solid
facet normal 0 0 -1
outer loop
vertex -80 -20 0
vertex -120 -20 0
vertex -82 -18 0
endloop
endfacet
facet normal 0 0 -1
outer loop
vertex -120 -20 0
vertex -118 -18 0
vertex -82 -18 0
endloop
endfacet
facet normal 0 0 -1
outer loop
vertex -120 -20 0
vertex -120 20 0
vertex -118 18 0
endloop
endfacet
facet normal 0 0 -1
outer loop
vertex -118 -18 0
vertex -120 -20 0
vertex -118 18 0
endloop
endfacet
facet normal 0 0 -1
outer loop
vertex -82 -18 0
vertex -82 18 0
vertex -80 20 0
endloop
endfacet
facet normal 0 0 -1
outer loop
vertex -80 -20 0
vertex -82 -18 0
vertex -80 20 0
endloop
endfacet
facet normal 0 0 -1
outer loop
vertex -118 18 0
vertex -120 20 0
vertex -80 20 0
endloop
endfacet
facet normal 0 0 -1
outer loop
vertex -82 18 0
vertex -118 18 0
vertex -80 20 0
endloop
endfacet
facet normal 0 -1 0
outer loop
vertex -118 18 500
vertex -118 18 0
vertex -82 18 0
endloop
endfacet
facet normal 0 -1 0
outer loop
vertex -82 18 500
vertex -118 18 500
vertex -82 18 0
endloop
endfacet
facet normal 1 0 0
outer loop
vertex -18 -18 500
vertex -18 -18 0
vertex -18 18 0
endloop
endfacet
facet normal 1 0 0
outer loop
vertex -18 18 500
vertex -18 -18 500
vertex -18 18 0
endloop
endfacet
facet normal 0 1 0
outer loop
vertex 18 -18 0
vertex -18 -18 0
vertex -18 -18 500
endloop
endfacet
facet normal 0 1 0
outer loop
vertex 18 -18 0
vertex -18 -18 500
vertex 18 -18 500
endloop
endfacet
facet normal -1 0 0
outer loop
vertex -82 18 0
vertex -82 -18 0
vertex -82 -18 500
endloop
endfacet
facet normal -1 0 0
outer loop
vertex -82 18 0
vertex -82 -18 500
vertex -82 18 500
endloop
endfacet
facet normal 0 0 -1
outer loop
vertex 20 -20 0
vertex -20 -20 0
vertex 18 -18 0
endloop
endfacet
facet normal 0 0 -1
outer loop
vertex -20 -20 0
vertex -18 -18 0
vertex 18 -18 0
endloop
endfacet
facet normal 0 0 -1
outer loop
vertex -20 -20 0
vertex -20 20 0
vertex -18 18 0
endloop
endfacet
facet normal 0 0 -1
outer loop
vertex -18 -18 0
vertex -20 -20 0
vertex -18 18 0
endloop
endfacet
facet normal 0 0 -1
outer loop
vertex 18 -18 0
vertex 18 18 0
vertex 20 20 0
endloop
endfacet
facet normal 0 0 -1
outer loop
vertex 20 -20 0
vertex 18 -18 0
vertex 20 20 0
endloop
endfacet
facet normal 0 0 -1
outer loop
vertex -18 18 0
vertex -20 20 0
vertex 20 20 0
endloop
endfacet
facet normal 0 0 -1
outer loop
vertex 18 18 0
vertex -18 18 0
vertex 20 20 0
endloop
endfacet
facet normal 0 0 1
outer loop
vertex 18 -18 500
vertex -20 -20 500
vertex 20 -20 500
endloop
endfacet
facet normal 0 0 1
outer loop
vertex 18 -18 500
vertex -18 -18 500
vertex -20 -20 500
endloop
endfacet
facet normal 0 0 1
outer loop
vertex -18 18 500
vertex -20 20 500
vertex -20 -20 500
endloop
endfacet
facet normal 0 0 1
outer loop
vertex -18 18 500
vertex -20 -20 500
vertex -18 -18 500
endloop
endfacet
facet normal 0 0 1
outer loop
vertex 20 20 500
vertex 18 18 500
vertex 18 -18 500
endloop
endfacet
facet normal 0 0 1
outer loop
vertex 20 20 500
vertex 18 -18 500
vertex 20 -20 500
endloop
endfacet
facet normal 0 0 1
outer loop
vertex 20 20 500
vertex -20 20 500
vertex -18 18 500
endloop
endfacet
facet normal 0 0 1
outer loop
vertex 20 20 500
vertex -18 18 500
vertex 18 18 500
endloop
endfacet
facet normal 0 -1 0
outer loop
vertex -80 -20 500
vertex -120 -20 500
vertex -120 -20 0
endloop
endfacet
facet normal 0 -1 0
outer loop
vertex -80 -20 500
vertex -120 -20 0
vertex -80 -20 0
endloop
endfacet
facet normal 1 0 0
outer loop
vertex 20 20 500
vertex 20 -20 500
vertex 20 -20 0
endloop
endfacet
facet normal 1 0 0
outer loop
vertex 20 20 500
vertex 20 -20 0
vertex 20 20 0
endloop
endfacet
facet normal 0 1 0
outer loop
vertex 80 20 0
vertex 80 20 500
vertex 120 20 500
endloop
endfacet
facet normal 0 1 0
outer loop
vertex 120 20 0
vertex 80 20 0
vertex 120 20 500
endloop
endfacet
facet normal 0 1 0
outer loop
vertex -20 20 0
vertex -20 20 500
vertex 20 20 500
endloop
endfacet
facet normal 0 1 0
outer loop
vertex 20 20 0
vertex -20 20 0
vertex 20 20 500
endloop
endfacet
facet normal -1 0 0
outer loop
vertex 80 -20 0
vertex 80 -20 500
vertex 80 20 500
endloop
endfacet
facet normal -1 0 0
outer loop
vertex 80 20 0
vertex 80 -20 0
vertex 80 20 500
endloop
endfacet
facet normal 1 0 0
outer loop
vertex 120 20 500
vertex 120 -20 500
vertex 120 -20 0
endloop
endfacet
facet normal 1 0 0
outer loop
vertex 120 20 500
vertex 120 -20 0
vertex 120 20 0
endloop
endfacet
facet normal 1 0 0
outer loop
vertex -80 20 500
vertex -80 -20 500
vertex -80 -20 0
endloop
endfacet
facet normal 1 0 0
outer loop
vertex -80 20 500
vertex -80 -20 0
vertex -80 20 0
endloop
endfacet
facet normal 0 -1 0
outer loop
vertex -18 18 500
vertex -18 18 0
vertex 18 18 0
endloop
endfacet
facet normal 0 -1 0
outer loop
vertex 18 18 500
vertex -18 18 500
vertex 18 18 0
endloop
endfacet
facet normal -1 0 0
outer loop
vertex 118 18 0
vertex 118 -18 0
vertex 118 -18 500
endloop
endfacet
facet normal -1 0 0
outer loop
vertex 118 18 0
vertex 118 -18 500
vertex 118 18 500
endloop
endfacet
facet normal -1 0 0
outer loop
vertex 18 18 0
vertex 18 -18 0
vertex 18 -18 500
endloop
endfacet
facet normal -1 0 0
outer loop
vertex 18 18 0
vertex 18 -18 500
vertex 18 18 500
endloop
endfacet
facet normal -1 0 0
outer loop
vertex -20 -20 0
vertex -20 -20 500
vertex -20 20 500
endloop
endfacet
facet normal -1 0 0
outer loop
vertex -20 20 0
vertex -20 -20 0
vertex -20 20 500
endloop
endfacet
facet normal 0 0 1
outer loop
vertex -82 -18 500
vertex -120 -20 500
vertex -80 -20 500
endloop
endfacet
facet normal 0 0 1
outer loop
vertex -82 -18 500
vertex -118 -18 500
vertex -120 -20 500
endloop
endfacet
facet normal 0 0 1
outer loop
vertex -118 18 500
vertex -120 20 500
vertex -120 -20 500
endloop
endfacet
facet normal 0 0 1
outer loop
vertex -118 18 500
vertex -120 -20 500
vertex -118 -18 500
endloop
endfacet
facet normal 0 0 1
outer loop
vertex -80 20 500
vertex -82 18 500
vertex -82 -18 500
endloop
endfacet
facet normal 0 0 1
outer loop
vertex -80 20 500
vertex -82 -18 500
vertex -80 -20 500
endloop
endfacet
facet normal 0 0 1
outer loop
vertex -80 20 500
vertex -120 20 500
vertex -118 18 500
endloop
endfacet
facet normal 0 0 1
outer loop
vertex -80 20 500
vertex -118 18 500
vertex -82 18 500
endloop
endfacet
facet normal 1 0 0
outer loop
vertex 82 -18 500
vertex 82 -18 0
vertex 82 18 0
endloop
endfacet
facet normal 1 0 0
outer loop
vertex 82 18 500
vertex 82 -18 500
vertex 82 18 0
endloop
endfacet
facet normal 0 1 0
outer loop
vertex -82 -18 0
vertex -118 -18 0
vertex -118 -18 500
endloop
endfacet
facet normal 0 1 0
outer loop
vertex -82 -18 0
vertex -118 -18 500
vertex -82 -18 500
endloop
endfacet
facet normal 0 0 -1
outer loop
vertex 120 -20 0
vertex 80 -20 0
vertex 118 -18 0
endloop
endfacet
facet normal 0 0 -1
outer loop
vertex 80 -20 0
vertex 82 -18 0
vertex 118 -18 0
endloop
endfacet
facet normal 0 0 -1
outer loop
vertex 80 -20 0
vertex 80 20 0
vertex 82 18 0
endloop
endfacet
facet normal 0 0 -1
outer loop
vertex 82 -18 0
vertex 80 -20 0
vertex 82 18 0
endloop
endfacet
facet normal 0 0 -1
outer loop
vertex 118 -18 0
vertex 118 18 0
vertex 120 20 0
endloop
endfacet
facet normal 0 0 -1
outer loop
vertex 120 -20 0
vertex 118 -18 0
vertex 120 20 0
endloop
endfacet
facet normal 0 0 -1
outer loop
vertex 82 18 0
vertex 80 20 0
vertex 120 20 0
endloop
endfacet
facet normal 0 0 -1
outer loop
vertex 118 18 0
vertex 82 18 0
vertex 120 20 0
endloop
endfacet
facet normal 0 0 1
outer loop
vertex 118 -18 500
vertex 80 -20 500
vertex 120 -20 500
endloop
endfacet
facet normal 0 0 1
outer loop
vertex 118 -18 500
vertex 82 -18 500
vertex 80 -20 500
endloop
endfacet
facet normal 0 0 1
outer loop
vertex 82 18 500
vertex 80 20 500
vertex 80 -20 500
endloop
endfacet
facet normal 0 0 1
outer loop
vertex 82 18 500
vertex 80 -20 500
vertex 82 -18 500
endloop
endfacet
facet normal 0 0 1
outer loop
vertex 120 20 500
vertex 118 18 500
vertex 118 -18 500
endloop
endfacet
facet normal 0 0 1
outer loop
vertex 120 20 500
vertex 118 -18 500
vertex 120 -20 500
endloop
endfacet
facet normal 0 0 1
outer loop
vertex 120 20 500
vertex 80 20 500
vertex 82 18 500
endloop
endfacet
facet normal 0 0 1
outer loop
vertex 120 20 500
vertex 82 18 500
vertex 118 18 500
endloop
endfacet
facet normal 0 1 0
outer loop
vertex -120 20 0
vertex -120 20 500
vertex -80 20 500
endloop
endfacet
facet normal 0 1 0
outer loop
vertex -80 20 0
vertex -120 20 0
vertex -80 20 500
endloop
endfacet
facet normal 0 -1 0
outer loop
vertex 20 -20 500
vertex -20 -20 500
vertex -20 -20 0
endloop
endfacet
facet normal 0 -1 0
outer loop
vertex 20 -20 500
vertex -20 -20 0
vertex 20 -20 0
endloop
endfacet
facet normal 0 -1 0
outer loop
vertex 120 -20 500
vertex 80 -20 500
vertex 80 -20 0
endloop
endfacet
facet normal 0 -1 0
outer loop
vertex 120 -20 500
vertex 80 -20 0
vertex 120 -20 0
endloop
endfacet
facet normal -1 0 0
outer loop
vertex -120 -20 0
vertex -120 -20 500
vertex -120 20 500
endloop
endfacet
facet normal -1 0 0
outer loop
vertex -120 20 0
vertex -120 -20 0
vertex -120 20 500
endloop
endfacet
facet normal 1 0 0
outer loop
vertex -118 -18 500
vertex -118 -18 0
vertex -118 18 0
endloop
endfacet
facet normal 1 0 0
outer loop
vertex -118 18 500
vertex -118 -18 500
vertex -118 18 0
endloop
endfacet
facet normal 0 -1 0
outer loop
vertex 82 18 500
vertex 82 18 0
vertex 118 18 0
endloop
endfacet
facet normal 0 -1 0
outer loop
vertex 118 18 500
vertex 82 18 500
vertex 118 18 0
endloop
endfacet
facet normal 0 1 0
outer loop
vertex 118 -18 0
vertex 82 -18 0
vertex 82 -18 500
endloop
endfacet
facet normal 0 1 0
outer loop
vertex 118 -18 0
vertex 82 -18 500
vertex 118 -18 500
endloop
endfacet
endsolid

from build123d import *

# Parameters (mm, degrees)
SKETCH_1_W      = 40
SKETCH_1_H      = 40
SKETCH_1_W_2    = 36
SKETCH_1_H_2    = 36
EXTRUDE_1_DEPTH = 500
SKETCH_2_W      = 40
SKETCH_2_H      = 40
SKETCH_2_W_2    = 36
SKETCH_2_H_2    = 36
EXTRUDE_2_DEPTH = 500
SKETCH_3_W      = 40
SKETCH_3_H      = 40
SKETCH_3_W_2    = 36
SKETCH_3_H_2    = 36
EXTRUDE_3_DEPTH = 500


with BuildPart() as part:
    # Эскиз1 → Бобышка-Вытянуть1 (new body)
    with BuildSketch(Plane.XY):
        with Locations((-100, 0)):
            Rectangle(SKETCH_1_W, SKETCH_1_H)
        with Locations((-100, 0)):
            Rectangle(SKETCH_1_W_2, SKETCH_1_H_2, mode=Mode.SUBTRACT)
    extrude(amount=EXTRUDE_1_DEPTH)


with BuildPart() as body_2:
    # Эскиз2 → Бобышка-Вытянуть2 (new body)
    with BuildSketch(Plane.XY):
        Rectangle(SKETCH_2_W, SKETCH_2_H)
        Rectangle(SKETCH_2_W_2, SKETCH_2_H_2, mode=Mode.SUBTRACT)
    extrude(amount=EXTRUDE_2_DEPTH)


with BuildPart() as body_3:
    # Эскиз3 → Бобышка-Вытянуть3 (new body)
    with BuildSketch(Plane.XY):
        with Locations((100, 0)):
            Rectangle(SKETCH_3_W, SKETCH_3_H)
        with Locations((100, 0)):
            Rectangle(SKETCH_3_W_2, SKETCH_3_H_2, mode=Mode.SUBTRACT)
    extrude(amount=EXTRUDE_3_DEPTH)


solid = Compound([part.part, body_2.part, body_3.part])
